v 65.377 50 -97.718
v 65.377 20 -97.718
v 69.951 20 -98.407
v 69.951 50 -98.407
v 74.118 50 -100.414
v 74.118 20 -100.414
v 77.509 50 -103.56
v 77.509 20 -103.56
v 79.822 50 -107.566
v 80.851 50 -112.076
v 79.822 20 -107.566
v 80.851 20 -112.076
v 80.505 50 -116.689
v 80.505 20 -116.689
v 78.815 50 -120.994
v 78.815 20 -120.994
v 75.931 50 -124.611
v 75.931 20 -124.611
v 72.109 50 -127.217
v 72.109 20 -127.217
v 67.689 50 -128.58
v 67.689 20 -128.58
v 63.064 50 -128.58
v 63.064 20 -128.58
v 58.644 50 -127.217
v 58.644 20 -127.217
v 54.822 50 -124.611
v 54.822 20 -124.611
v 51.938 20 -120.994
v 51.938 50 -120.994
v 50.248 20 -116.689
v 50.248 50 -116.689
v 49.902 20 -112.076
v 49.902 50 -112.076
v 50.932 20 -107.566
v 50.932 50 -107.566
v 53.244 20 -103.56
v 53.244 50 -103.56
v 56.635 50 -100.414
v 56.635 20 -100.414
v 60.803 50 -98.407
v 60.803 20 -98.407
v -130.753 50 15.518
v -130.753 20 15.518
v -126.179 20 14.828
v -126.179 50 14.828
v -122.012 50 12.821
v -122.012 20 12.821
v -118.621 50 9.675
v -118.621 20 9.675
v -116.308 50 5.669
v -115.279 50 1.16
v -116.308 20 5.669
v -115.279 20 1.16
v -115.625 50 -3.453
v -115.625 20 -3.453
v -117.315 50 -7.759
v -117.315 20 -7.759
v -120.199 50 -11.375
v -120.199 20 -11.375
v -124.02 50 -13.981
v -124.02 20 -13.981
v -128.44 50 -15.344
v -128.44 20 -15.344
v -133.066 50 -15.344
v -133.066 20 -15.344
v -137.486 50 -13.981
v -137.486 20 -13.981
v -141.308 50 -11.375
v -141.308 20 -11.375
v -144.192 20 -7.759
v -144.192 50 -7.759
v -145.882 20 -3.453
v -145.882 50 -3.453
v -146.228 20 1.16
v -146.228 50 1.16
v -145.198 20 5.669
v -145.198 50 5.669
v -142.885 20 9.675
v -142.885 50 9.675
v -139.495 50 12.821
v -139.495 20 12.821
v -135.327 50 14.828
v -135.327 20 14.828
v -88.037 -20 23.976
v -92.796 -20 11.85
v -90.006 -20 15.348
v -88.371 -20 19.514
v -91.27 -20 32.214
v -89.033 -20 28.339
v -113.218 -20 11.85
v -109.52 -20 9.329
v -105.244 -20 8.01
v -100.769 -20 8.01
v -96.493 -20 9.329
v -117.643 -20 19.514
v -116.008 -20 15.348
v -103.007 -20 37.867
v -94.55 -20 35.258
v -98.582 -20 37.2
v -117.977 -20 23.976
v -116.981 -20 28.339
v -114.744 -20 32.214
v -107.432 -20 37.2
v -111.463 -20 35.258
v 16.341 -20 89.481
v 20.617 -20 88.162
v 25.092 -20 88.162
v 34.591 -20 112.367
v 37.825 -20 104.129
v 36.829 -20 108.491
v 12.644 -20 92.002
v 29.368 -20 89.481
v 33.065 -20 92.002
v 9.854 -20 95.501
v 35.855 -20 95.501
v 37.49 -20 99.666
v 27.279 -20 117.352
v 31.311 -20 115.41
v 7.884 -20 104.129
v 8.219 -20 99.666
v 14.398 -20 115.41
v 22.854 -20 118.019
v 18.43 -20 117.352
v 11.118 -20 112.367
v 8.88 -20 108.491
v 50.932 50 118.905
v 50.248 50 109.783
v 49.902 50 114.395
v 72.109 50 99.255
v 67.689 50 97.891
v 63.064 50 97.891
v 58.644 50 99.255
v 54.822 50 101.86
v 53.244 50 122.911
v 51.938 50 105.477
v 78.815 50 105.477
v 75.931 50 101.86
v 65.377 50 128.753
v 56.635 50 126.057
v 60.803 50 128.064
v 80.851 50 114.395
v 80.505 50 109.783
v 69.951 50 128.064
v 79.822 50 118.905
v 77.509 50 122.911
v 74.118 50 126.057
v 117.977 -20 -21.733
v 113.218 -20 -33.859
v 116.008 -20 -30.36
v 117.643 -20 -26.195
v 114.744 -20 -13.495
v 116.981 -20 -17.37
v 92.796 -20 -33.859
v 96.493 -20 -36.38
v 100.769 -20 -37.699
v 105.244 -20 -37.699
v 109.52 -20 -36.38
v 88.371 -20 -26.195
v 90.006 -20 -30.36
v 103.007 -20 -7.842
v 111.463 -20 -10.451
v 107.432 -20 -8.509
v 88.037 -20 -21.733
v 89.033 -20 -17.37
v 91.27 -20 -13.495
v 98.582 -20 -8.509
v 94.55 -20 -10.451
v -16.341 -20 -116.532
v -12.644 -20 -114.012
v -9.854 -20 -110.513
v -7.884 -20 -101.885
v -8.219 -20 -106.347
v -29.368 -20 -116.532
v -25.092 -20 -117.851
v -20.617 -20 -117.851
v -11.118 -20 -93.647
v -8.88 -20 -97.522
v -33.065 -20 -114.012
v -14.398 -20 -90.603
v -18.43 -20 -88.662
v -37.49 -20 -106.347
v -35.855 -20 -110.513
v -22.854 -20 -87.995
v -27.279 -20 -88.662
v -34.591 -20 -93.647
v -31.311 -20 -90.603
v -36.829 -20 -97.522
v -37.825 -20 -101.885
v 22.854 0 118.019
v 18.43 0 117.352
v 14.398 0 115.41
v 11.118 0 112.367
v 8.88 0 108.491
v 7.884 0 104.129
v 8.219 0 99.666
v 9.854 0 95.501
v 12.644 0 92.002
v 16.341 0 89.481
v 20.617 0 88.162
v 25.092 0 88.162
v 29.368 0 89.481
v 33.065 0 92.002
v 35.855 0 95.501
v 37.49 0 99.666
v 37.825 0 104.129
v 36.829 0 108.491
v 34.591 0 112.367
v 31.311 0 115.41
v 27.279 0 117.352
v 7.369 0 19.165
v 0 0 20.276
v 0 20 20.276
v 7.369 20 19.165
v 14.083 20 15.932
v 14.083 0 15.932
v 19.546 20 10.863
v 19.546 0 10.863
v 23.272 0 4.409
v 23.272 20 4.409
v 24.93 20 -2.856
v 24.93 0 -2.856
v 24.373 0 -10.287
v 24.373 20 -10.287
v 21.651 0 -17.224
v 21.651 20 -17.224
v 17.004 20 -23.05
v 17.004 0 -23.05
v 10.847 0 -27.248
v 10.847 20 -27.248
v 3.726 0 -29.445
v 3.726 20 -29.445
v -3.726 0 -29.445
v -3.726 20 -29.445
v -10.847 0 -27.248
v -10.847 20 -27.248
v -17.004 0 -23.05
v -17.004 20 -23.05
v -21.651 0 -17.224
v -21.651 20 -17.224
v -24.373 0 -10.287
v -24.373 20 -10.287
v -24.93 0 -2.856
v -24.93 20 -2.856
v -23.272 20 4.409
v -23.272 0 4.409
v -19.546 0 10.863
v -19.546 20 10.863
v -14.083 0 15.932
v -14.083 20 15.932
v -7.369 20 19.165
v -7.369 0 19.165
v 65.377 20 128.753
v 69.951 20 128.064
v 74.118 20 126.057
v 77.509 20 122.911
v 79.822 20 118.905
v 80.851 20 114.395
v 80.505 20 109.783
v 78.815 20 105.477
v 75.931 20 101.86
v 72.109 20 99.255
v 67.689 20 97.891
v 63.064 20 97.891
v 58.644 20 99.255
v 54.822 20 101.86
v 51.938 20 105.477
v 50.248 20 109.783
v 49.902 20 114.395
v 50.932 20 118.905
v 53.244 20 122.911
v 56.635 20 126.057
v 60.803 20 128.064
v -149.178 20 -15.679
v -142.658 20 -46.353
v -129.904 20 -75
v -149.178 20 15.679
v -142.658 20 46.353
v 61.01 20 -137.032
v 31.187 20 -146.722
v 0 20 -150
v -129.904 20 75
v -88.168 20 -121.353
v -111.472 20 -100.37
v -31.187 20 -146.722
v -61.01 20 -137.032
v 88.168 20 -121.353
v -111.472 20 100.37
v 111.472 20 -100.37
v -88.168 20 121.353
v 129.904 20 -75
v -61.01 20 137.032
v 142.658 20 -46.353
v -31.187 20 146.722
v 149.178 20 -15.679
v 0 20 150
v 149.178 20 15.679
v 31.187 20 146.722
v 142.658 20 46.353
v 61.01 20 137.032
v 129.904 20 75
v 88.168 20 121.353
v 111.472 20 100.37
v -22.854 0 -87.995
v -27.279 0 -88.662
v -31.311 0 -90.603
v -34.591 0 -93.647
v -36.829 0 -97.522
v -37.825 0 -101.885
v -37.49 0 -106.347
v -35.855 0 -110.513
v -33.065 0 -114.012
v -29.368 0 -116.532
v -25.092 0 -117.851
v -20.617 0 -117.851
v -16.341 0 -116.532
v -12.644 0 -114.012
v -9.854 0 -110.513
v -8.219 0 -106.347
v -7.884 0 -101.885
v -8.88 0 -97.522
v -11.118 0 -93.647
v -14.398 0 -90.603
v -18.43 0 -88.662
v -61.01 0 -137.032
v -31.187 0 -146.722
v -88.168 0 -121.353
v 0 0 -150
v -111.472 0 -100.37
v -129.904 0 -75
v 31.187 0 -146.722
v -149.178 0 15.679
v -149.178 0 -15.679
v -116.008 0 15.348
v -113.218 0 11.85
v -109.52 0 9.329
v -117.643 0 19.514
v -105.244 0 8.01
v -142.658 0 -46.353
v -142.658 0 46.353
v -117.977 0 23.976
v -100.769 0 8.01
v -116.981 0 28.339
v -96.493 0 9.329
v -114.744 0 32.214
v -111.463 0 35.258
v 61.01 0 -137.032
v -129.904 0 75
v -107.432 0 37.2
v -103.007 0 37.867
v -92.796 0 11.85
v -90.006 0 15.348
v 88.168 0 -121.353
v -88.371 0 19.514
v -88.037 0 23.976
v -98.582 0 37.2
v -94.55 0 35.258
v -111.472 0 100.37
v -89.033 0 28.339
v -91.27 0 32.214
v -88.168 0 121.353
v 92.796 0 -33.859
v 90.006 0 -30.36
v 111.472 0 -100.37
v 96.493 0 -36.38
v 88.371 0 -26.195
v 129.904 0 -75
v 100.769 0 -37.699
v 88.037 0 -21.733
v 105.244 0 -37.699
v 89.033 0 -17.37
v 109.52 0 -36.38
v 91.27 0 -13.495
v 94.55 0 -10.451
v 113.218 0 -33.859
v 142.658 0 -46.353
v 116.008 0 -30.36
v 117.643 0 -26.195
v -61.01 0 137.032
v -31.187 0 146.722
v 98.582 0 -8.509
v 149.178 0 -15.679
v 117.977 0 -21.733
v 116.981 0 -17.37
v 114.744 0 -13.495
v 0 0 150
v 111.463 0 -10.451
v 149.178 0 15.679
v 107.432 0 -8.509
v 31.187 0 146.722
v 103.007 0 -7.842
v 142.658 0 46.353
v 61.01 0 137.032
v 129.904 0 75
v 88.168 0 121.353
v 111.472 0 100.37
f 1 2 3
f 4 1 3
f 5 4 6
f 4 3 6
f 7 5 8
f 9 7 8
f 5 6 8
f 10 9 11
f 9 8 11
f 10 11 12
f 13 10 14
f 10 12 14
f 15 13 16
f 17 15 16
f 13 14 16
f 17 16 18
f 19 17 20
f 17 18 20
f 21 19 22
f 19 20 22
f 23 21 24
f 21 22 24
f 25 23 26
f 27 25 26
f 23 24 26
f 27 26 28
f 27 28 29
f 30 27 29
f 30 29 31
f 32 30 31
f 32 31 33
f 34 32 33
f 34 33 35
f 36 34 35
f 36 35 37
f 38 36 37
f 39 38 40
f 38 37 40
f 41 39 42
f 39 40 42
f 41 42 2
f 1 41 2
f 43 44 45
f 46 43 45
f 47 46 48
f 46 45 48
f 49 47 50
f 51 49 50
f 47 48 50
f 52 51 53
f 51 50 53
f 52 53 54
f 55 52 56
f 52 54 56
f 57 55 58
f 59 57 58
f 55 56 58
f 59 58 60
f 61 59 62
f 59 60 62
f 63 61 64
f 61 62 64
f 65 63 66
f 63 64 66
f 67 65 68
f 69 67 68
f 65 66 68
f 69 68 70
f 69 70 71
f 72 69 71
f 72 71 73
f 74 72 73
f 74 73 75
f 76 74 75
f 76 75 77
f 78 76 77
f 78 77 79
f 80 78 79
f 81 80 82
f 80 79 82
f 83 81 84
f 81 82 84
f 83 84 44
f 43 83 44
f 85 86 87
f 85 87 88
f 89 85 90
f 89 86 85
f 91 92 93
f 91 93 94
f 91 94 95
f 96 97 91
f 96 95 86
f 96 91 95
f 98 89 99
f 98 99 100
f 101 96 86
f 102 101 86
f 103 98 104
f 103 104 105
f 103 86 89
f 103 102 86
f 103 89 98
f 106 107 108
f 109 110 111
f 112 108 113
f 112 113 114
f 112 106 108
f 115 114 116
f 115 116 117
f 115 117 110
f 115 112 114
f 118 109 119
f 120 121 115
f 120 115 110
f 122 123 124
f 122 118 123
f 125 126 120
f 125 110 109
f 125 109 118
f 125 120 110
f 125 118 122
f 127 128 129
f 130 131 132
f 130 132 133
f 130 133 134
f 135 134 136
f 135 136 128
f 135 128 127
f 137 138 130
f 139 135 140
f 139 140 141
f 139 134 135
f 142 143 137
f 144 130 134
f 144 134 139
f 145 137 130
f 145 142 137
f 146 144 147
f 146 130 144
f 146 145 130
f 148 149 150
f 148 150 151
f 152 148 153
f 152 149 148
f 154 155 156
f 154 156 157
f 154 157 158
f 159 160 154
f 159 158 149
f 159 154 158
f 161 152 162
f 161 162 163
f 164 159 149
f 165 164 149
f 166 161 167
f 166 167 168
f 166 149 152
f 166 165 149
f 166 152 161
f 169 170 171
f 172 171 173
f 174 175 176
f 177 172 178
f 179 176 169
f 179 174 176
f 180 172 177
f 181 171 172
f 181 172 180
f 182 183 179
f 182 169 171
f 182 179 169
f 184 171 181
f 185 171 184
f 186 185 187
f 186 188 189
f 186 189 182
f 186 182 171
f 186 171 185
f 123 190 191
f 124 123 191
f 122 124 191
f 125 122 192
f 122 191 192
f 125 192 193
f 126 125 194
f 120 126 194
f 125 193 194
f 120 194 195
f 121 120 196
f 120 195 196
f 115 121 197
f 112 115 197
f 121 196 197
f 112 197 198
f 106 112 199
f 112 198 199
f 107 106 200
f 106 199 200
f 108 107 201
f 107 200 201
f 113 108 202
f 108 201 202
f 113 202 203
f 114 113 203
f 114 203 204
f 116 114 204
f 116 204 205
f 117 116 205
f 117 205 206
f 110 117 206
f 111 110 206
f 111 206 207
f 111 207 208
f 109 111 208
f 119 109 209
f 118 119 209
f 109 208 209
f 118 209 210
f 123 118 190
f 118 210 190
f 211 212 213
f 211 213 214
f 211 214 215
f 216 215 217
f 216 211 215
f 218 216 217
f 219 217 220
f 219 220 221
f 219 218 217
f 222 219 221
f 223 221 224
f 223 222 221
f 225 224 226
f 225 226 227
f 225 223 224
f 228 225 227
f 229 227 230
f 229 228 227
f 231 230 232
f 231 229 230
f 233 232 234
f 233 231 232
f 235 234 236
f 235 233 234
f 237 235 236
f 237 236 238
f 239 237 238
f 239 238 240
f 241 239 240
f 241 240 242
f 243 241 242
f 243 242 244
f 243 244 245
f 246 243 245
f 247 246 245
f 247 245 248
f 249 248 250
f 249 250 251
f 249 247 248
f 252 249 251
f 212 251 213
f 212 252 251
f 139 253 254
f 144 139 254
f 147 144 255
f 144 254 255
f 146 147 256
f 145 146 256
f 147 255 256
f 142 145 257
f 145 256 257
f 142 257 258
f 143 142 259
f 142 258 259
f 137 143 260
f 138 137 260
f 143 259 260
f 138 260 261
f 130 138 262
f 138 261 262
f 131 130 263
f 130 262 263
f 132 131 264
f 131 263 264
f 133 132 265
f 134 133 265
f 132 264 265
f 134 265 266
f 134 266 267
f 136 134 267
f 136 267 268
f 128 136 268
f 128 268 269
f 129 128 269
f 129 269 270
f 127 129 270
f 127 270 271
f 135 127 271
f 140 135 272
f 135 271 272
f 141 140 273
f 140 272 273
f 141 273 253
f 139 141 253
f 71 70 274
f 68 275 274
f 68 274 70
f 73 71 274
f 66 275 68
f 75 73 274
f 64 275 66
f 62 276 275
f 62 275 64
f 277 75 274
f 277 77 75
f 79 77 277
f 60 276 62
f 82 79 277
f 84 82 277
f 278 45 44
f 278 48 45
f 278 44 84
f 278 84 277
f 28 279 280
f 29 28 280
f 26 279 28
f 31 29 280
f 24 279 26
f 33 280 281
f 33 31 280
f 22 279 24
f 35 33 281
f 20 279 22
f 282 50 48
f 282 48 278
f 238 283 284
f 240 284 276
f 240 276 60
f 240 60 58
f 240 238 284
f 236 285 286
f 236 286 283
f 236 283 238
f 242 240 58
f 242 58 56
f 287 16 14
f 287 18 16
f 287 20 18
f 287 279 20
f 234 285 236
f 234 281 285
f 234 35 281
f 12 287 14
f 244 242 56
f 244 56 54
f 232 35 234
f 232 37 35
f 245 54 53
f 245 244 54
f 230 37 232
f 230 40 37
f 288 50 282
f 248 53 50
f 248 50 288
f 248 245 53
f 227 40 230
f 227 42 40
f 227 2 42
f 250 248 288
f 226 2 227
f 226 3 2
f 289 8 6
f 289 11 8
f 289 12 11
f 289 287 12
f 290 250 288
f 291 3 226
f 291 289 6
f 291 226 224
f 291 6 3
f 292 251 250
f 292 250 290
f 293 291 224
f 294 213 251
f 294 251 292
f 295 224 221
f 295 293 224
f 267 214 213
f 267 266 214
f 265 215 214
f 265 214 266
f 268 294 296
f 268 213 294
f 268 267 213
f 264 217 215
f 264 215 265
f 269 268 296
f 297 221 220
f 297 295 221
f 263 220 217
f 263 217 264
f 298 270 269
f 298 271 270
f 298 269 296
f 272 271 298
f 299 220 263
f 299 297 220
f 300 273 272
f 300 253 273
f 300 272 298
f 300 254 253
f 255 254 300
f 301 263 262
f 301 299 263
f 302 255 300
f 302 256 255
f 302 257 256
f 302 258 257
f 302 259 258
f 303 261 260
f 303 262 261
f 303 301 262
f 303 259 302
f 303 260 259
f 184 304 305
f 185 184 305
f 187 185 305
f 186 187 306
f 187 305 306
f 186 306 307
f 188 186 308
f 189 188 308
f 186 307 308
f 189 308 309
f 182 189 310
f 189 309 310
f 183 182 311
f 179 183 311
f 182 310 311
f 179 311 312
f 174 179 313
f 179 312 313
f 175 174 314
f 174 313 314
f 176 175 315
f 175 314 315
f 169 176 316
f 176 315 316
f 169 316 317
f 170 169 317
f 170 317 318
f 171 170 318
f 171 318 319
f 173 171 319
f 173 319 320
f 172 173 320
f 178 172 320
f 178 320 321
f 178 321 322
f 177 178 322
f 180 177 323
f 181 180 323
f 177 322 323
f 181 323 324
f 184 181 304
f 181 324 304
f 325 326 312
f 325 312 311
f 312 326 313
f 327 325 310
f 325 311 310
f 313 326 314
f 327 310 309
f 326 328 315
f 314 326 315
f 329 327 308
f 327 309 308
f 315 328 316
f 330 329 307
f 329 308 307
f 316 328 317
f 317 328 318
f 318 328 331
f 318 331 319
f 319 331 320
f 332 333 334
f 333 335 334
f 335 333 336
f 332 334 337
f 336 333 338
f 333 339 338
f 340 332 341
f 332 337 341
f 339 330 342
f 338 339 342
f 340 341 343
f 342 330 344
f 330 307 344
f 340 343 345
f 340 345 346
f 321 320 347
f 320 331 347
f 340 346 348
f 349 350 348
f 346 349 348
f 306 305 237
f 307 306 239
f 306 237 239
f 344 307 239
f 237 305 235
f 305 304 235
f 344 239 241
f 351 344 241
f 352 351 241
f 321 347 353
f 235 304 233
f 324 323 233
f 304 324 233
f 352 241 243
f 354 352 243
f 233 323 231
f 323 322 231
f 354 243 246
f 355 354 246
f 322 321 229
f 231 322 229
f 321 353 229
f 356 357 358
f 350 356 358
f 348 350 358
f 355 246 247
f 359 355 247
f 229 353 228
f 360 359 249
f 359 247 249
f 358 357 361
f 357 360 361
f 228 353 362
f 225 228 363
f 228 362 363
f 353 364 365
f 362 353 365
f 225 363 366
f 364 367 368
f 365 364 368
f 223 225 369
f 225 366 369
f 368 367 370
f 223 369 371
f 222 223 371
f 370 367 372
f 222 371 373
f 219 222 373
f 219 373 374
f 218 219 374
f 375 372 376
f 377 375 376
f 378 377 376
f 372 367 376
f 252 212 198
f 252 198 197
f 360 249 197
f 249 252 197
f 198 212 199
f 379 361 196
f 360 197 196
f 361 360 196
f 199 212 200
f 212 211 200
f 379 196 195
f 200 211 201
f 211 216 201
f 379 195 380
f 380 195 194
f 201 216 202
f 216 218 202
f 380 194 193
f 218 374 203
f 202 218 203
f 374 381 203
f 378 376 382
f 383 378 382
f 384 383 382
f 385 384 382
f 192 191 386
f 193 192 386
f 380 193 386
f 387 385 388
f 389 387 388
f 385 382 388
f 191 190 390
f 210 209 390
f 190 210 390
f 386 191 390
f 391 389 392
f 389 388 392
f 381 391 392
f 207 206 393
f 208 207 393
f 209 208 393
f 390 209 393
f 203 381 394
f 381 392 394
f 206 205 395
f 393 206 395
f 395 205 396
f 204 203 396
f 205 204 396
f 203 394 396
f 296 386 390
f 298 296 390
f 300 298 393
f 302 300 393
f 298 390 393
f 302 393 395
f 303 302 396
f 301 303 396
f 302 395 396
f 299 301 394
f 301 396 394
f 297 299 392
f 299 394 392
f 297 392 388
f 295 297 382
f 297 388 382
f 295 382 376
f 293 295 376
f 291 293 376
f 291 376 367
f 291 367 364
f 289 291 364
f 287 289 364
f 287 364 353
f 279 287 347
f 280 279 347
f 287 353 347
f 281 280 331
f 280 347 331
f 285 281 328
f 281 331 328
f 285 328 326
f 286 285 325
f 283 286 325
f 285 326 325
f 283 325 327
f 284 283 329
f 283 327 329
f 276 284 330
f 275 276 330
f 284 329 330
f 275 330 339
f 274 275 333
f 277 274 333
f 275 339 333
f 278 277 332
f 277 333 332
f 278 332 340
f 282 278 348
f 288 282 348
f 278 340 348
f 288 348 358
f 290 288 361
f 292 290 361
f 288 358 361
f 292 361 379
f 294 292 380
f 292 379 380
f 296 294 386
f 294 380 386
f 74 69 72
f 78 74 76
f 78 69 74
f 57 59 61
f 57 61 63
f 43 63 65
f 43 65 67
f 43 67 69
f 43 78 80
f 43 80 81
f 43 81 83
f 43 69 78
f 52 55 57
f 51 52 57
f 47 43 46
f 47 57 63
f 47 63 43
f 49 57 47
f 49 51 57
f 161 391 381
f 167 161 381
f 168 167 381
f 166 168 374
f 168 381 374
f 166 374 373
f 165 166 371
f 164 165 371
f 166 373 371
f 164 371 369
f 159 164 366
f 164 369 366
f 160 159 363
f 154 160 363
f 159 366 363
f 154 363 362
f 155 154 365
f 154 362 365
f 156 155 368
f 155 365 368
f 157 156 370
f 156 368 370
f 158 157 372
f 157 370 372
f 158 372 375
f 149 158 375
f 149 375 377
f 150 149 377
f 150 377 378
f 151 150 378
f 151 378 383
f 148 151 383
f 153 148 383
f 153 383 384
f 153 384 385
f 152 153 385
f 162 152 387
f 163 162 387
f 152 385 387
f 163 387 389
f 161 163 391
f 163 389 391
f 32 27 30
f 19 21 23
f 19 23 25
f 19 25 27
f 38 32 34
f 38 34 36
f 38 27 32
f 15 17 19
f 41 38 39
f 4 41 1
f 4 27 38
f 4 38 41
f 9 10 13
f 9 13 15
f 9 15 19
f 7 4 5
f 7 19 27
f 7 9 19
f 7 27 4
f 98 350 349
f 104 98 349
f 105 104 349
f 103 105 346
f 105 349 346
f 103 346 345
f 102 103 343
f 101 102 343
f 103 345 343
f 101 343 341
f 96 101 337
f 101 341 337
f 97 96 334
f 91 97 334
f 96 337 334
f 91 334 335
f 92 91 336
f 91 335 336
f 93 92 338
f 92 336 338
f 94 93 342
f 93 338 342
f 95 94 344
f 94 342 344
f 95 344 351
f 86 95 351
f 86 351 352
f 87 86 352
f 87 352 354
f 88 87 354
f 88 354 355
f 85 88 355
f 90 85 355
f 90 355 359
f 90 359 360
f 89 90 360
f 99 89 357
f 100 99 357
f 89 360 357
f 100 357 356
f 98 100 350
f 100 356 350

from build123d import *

# Parameters (mm, degrees)
SKETCH1_R           = 150
SKETCH1_R_2         = 25
BOSS_EXTRUDE1_DEPTH = 20
SKETCH2_R           = 15.517679246
BOSS_EXTRUDE2_DEPTH = 30
SKETCH3_R           = 15.012096723
BOSS_EXTRUDE3_DEPTH = 20


with BuildPart() as part:
    # Sketch1 → Boss-Extrude1 (new body)
    with BuildSketch(Plane(origin=(0, 0, 0), x_dir=(1, 0, 0), z_dir=(0, 1, 0))):
        with Locations(Location((0, 0, 0), (0, 0, 270))):
            Circle(SKETCH1_R)
        with Locations(Location((0, 4.724194593, 0), (0, 0, 270))):
            Circle(SKETCH1_R_2, mode=Mode.SUBTRACT)
    extrude(amount=BOSS_EXTRUDE1_DEPTH)

    # Sketch2 → Boss-Extrude2 (add)
    with BuildSketch(Plane(origin=(0, 20, 0), x_dir=(1, 0, 0), z_dir=(0, 1, 0))):
        with Locations(Location((-130.753213973, 0, 0), (0, 0, 270))):
            Circle(SKETCH2_R)
        with Locations(Location((65.376606987, 113.235604927, 0), (0, 0, 270))):
            Circle(SKETCH2_R)
        with Locations(Location((65.376606987, -113.235604927, 0), (0, 0, 270))):
            Circle(SKETCH2_R)
    extrude(amount=BOSS_EXTRUDE2_DEPTH)

    # Sketch3 → Boss-Extrude3 (add)
    with BuildSketch(Plane.XZ):
        with Locations(Location((-103.00688249, 22.854430971, 0), (0, 0, 90))):
            Circle(SKETCH3_R)
        with Locations(Location((22.854430971, 103.00688249, 0), (0, 0, 90))):
            Circle(SKETCH3_R)
        with Locations(Location((103.00688249, -22.854430971, 0), (0, 0, 90))):
            Circle(SKETCH3_R)
        with Locations(Location((-22.854430971, -103.00688249, 0), (0, 0, 90))):
            Circle(SKETCH3_R)
    extrude(amount=BOSS_EXTRUDE3_DEPTH)


solid = part.part
